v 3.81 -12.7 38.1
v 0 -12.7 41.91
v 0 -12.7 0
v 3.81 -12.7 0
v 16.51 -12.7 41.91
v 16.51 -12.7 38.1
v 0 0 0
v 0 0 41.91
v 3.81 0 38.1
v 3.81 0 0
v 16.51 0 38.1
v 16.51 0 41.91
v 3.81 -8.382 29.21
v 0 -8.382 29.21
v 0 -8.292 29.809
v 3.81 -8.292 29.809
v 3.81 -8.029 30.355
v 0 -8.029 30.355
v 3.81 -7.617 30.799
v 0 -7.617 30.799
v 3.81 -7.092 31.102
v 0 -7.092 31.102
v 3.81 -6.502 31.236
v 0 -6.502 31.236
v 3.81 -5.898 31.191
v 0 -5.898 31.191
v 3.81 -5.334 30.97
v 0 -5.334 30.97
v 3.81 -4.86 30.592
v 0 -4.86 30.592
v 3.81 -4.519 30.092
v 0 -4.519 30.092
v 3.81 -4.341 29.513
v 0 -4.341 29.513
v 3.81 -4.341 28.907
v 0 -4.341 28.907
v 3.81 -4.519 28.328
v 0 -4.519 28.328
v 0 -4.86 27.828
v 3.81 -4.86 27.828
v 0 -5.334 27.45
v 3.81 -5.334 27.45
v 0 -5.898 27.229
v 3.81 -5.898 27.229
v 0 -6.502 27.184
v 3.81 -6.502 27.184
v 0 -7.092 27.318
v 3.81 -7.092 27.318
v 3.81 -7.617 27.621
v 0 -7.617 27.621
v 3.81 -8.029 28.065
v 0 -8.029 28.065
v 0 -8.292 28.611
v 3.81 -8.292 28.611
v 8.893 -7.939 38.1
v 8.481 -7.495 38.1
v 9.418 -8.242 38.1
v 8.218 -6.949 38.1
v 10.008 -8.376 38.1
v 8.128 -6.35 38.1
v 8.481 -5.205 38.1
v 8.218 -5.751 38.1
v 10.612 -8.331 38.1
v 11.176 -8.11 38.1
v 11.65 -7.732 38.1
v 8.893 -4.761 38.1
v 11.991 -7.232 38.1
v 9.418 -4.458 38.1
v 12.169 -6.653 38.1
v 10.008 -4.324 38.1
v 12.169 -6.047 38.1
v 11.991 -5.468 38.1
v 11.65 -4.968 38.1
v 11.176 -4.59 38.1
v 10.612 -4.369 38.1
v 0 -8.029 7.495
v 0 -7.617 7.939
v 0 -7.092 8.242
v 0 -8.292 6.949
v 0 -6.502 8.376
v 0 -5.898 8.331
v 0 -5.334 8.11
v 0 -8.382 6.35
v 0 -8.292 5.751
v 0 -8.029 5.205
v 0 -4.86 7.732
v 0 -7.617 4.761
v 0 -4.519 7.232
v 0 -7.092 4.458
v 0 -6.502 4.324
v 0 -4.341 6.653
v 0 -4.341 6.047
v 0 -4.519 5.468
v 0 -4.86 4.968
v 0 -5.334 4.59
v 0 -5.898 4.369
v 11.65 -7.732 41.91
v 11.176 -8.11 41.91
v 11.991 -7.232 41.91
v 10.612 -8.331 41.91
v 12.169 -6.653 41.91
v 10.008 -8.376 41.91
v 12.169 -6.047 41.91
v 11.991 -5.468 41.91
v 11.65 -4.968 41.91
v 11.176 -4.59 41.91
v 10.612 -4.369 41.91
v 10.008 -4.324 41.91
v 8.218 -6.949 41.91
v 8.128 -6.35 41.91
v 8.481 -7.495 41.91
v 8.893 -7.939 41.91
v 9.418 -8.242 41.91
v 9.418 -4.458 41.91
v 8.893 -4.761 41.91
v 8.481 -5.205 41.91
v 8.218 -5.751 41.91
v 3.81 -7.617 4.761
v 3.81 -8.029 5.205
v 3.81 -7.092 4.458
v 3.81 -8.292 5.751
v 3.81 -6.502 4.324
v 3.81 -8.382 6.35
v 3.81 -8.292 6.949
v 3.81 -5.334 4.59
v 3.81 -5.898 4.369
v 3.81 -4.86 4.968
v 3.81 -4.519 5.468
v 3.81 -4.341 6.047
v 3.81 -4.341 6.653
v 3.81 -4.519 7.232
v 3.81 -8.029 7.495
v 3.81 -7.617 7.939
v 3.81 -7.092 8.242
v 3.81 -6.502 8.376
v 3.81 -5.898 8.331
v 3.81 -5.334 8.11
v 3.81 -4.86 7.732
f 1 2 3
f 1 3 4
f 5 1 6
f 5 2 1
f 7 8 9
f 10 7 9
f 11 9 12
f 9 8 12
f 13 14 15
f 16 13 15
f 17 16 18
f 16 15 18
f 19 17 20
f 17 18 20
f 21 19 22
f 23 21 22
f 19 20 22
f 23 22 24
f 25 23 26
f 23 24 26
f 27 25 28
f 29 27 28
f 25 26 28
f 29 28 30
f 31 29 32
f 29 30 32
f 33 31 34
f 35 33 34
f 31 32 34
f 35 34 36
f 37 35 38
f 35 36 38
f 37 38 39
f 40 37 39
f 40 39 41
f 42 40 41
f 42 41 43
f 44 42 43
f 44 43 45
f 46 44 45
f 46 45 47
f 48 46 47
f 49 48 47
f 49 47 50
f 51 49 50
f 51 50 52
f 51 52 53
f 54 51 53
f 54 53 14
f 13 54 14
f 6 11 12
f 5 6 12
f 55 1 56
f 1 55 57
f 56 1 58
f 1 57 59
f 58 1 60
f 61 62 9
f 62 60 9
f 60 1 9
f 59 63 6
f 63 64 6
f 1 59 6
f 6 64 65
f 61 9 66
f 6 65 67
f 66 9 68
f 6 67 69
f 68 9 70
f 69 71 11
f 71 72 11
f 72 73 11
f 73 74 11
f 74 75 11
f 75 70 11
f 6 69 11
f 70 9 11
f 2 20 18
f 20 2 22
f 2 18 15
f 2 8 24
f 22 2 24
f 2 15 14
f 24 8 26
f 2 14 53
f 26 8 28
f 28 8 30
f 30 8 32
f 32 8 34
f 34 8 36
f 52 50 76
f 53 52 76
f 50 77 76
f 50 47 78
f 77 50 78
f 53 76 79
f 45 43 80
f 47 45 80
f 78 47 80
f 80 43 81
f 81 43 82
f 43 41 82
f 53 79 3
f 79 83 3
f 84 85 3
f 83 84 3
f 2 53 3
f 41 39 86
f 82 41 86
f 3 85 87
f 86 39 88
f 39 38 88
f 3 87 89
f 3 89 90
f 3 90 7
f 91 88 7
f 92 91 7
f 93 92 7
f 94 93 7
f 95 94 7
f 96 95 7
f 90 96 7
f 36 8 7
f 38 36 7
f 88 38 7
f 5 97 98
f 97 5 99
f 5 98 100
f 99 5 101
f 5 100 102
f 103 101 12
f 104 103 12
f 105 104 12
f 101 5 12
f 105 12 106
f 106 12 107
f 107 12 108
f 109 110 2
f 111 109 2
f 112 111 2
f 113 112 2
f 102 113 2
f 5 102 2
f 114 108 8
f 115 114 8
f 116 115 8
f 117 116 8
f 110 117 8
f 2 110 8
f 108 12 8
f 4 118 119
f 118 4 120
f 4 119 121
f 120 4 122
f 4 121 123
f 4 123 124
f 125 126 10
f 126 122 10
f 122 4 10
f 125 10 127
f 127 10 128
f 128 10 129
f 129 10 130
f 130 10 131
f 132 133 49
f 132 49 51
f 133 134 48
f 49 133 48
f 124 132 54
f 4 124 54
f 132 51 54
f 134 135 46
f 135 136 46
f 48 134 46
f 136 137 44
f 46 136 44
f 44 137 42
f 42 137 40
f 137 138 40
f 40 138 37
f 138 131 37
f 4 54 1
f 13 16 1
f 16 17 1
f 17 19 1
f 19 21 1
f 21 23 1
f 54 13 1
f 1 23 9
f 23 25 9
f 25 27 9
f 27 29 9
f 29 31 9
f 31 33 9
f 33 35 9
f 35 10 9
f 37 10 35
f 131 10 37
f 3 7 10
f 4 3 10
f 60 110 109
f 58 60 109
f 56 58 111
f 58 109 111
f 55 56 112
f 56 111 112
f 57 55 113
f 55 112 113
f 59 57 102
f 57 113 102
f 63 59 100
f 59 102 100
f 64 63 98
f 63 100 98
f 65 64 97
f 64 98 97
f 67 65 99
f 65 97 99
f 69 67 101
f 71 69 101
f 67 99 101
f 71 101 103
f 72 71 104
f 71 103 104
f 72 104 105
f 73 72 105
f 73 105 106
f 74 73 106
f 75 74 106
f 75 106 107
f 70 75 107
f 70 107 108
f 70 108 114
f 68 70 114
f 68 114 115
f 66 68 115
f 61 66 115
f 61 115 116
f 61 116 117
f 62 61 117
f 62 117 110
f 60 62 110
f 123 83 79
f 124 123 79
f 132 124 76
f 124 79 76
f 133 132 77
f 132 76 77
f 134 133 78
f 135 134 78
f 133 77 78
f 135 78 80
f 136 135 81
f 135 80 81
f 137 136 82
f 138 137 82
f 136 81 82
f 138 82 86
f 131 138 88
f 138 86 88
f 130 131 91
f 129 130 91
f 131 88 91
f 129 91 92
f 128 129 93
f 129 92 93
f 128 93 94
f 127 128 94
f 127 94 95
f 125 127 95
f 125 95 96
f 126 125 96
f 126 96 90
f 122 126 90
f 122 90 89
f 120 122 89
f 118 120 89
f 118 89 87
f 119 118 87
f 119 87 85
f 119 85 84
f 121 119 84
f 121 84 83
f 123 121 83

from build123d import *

# Parameters (mm, degrees)
F1_DEPTH = 12.7
F3_D     = 4.064
F5_D     = 4.064


with BuildPart() as f1:
    # F0 (on Front) → F1 (new body)
    with BuildSketch(Plane.XZ):
        Polygon((0, 41.91), (0, 0), (3.81, 0), (3.81, 38.1), (16.51, 38.1), (16.51, 41.91), align=None)
    extrude(amount=F1_DEPTH)

    # F3 (through all)
    with Locations(Plane(origin=(0, 0, 38.1), x_dir=(1, 0, 0), z_dir=(0, 0, -1))):
        with Locations((10.16, 6.35)):
            Hole(F3_D / 2)

    # F5 (through all)
    with Locations(Plane.YZ.offset(3.81)):
        with Locations((-6.35, 29.21), (-6.35, 6.35)):
            Hole(F5_D / 2)


solid = f1.part
